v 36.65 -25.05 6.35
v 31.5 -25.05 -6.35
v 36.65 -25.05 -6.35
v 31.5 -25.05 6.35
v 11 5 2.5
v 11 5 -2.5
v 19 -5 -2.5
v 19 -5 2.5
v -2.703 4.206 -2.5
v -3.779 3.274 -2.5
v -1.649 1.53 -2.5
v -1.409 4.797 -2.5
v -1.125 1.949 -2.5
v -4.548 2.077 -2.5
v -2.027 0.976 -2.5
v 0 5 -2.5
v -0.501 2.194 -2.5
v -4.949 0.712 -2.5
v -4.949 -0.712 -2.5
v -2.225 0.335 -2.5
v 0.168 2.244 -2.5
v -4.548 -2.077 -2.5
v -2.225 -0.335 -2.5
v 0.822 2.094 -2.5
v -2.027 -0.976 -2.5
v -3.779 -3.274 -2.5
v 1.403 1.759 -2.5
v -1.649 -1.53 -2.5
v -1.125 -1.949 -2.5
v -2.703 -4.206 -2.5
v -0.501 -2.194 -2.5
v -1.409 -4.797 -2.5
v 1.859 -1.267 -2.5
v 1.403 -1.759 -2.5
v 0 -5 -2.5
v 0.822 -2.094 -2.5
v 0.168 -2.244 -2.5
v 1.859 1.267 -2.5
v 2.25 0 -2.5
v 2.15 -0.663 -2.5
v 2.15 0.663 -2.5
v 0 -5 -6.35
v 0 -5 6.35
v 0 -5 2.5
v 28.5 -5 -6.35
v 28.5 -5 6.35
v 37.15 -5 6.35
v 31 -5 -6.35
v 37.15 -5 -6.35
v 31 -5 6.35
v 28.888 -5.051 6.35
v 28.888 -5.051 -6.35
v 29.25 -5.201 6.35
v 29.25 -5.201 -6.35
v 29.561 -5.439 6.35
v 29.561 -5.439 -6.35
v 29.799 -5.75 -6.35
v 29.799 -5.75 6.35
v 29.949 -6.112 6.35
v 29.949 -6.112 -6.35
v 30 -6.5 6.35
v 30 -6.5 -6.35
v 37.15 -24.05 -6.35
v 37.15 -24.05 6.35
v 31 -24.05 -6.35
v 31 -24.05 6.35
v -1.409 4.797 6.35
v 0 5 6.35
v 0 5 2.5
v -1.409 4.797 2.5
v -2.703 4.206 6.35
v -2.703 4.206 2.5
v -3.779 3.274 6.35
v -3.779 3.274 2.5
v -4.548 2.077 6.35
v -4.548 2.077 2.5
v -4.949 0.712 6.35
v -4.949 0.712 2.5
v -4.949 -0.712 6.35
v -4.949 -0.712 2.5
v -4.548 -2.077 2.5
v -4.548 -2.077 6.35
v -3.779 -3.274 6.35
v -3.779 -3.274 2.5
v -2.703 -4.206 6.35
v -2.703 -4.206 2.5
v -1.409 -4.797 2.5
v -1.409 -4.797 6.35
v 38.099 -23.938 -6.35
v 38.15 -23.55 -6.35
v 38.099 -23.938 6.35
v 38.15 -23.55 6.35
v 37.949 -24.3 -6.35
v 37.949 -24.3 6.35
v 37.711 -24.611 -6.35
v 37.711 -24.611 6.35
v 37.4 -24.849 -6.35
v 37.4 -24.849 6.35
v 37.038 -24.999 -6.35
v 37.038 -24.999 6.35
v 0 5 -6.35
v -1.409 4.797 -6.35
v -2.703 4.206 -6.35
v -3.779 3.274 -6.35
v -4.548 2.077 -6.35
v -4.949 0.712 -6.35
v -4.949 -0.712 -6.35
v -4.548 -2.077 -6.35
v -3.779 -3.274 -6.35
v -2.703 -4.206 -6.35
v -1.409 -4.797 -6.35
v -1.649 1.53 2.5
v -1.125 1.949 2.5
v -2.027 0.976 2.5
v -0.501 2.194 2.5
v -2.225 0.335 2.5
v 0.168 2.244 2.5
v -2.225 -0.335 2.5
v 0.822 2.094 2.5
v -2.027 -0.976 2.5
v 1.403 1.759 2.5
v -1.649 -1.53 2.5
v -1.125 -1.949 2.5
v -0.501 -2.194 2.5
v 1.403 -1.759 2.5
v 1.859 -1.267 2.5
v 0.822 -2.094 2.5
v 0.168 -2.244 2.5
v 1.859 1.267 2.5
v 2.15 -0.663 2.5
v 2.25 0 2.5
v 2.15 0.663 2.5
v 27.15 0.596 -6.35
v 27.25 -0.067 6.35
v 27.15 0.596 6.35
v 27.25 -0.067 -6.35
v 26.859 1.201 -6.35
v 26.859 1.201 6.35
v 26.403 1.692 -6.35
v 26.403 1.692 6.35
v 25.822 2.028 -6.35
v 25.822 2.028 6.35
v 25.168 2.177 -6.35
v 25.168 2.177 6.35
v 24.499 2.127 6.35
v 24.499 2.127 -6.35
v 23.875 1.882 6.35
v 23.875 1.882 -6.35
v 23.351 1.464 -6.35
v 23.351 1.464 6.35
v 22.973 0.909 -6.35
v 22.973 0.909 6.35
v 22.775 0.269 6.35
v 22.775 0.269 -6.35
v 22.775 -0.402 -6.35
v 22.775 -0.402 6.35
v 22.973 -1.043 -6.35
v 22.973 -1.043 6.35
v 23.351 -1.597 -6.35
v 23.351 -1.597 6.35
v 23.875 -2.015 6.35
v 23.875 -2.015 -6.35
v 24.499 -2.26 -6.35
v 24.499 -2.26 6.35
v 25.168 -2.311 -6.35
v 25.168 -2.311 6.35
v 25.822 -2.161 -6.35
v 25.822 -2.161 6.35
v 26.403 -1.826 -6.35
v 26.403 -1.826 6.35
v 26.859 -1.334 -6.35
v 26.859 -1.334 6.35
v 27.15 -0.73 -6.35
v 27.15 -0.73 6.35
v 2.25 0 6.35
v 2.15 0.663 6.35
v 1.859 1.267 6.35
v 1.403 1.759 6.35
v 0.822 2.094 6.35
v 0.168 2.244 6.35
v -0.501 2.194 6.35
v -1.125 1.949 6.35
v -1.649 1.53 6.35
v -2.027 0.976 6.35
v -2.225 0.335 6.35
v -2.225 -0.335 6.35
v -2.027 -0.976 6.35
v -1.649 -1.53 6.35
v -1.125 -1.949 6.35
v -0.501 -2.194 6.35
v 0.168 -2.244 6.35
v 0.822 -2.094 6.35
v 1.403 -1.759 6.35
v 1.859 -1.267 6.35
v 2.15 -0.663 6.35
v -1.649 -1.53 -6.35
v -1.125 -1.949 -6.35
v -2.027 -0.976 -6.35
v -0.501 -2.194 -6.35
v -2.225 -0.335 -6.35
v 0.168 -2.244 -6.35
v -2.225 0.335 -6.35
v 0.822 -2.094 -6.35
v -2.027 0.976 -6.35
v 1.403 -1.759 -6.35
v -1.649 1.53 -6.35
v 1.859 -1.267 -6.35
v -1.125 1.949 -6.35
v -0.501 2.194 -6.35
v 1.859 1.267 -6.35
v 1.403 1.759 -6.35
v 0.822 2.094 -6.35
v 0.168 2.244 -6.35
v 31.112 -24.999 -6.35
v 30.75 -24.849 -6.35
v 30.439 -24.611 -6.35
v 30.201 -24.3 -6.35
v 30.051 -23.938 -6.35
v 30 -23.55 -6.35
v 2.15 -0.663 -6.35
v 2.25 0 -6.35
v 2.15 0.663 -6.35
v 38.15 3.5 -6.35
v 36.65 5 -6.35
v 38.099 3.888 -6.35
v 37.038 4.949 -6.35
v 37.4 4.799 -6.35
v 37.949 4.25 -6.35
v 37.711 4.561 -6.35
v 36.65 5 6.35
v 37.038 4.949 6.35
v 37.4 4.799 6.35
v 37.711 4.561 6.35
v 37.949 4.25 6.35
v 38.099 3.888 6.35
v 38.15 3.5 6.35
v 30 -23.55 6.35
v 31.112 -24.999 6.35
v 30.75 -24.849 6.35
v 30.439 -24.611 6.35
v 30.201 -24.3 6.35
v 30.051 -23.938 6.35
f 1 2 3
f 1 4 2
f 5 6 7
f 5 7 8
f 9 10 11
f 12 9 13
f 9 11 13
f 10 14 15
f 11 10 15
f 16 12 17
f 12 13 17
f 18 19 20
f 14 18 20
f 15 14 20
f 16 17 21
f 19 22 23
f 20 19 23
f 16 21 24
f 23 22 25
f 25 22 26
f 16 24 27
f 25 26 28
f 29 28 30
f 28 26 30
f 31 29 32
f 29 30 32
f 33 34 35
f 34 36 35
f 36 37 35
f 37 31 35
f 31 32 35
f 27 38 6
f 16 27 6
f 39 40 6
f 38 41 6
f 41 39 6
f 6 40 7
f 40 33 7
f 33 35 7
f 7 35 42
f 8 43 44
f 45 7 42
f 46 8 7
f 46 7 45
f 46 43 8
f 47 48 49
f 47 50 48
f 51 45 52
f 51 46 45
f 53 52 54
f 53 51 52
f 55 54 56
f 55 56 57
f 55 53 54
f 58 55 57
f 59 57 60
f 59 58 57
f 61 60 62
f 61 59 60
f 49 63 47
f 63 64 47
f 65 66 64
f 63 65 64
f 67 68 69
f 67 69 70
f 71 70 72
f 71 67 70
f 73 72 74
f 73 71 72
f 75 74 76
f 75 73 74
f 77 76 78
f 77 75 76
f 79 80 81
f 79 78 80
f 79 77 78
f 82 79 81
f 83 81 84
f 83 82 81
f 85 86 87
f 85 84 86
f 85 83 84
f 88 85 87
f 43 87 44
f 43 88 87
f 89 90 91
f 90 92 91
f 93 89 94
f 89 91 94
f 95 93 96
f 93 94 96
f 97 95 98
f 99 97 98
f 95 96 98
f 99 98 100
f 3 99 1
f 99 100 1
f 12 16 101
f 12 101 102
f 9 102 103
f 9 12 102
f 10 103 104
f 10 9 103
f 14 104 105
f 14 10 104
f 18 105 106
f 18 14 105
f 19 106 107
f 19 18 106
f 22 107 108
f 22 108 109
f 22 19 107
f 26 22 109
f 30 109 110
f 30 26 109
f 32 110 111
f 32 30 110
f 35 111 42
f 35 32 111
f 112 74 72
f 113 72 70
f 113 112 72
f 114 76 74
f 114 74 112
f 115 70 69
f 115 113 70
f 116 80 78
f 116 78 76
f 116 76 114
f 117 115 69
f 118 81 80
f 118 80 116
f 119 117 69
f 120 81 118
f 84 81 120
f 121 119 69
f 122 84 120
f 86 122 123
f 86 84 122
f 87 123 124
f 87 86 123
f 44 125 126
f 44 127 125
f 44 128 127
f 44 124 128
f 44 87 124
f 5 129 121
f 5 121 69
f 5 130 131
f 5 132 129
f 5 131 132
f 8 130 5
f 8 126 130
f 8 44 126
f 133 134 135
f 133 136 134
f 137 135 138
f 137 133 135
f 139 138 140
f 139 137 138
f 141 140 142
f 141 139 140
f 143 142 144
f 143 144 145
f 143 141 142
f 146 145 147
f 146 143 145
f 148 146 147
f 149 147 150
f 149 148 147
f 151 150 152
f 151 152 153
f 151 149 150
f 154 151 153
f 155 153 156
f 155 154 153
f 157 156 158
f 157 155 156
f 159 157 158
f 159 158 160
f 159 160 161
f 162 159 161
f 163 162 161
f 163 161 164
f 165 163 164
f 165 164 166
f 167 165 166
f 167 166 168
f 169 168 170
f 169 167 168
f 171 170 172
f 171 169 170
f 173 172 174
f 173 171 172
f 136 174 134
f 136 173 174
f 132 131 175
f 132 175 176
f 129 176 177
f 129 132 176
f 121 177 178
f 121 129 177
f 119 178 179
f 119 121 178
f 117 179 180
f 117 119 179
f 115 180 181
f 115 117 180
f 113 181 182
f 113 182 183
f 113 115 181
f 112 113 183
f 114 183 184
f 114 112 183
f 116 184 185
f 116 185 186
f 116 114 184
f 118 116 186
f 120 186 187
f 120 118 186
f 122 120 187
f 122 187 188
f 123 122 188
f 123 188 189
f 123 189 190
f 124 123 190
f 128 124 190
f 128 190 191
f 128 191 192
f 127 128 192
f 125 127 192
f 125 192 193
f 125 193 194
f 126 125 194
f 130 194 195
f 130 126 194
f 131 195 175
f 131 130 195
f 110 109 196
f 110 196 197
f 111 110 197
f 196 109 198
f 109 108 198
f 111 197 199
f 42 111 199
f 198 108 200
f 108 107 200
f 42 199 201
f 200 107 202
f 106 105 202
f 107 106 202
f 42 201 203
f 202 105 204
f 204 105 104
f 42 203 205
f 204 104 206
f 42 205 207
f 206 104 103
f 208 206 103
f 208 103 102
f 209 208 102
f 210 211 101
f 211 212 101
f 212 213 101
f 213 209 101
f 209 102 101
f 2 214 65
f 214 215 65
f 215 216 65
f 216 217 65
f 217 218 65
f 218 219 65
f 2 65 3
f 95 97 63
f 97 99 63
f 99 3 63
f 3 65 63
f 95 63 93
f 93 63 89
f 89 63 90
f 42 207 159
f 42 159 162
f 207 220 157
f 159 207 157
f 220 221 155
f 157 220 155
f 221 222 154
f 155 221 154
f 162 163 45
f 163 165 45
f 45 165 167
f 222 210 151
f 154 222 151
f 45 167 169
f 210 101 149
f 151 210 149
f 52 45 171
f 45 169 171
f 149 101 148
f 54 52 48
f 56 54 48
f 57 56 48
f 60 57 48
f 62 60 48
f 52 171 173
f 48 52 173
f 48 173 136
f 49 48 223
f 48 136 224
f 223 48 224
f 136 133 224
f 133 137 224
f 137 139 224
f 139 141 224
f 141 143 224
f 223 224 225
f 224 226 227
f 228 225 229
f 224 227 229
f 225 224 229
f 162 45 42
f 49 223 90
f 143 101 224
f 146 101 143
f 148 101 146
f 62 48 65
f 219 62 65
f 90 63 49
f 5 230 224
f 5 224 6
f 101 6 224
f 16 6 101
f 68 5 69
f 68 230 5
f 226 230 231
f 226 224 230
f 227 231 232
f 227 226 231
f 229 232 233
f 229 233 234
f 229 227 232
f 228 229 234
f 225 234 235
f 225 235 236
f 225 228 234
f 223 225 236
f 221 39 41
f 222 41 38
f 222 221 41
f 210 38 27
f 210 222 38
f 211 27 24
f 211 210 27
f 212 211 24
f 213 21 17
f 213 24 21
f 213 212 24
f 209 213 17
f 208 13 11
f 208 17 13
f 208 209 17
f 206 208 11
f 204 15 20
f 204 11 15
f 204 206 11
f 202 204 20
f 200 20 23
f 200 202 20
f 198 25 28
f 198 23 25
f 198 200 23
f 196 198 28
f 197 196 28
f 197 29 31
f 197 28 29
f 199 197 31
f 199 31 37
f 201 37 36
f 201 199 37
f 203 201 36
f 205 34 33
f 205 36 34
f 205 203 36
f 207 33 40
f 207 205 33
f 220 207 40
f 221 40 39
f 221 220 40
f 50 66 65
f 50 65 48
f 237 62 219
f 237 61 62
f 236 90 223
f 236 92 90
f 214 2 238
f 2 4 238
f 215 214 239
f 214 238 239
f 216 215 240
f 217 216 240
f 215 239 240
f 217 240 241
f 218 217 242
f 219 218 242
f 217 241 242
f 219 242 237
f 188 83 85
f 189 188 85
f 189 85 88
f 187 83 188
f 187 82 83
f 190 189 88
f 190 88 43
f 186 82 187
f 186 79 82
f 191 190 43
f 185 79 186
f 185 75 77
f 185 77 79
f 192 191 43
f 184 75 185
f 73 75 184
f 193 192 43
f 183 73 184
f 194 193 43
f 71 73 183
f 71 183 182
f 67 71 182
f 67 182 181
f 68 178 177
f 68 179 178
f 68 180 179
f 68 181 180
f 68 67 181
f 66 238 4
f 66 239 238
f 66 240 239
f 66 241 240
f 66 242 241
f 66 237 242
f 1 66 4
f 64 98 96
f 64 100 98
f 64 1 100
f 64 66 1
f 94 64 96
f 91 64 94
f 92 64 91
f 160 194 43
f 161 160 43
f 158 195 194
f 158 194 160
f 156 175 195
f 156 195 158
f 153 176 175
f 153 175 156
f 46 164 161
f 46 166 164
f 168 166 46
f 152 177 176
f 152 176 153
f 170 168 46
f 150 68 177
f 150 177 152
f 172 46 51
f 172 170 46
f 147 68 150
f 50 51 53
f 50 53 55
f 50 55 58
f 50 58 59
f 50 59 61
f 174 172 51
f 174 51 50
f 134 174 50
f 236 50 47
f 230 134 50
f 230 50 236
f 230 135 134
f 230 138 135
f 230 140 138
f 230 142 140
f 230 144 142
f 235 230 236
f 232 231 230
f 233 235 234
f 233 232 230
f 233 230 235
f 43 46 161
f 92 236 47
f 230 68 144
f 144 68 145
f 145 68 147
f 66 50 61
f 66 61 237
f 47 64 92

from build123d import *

# Parameters (mm, degrees)
SKETCH1_R           = 2.25
SKETCH1_W           = 6.15
SKETCH1_H           = 19.05
BOSS_EXTRUDE1_DEPTH = 6.35
SKETCH13_W          = 16
SKETCH13_H          = 5
CUT_EXTRUDE1_DEPTH  = 10
CHAMFER1_SIZE2      = 10
CHAMFER1_SIZE       = 8
FILLET1_R           = 1.5


with BuildPart() as part:
    # Sketch1 → Boss-Extrude1 (new, symmetric)
    with BuildSketch(Plane.XY):
        with BuildLine():
            Line((0, -5), (30, -5))
            Line((30, -5), (30, -25.05))
            Line((30, -25.05), (38.15, -25.05))
            Line((38.15, -25.05), (38.15, 5))
            Line((38.15, 5), (0, 5))
            ThreePointArc((0, 5), (-5, 0), (0, -5))
        make_face()
        Circle(SKETCH1_R, mode=Mode.SUBTRACT)
        with Locations((25, -0.066795827)):
            Circle(SKETCH1_R, mode=Mode.SUBTRACT)
        with Locations((34.075, -14.525)):
            Rectangle(SKETCH1_W, SKETCH1_H, mode=Mode.SUBTRACT)
    extrude(amount=BOSS_EXTRUDE1_DEPTH, both=True)

    # Sketch13 → Cut-Extrude1 (cut)
    with BuildSketch(Plane.XZ.offset(5)):
        with Locations((3, 0)):
            Rectangle(SKETCH13_W, SKETCH13_H)
    extrude(amount=-CUT_EXTRUDE1_DEPTH, mode=Mode.SUBTRACT)

    # Chamfer1
    chamfer1_edges = [part.edges().sort_by_distance(p)[0] for p in [
        (11, -5, 0),
    ]]
    chamfer1_side = [part.faces().sort_by_distance(p)[0] for p in [
        (11.16, -5, 0),
    ]]
    chamfer(chamfer1_edges, length=CHAMFER1_SIZE - 0.0001, length2=CHAMFER1_SIZE2 - 0.0001, reference=chamfer1_side[0])  # a hair under: the kernel refuses the full size

    # Fillet1
    fillet1_edges = [part.edges().sort_by_distance(p)[0] for p in [
        (38.15, 5, 0),
        (38.15, -25.05, 0),
        (30, -25.05, 0),
        (30, -5, 0),
    ]]
    fillet(fillet1_edges, radius=FILLET1_R)


solid = part.part
